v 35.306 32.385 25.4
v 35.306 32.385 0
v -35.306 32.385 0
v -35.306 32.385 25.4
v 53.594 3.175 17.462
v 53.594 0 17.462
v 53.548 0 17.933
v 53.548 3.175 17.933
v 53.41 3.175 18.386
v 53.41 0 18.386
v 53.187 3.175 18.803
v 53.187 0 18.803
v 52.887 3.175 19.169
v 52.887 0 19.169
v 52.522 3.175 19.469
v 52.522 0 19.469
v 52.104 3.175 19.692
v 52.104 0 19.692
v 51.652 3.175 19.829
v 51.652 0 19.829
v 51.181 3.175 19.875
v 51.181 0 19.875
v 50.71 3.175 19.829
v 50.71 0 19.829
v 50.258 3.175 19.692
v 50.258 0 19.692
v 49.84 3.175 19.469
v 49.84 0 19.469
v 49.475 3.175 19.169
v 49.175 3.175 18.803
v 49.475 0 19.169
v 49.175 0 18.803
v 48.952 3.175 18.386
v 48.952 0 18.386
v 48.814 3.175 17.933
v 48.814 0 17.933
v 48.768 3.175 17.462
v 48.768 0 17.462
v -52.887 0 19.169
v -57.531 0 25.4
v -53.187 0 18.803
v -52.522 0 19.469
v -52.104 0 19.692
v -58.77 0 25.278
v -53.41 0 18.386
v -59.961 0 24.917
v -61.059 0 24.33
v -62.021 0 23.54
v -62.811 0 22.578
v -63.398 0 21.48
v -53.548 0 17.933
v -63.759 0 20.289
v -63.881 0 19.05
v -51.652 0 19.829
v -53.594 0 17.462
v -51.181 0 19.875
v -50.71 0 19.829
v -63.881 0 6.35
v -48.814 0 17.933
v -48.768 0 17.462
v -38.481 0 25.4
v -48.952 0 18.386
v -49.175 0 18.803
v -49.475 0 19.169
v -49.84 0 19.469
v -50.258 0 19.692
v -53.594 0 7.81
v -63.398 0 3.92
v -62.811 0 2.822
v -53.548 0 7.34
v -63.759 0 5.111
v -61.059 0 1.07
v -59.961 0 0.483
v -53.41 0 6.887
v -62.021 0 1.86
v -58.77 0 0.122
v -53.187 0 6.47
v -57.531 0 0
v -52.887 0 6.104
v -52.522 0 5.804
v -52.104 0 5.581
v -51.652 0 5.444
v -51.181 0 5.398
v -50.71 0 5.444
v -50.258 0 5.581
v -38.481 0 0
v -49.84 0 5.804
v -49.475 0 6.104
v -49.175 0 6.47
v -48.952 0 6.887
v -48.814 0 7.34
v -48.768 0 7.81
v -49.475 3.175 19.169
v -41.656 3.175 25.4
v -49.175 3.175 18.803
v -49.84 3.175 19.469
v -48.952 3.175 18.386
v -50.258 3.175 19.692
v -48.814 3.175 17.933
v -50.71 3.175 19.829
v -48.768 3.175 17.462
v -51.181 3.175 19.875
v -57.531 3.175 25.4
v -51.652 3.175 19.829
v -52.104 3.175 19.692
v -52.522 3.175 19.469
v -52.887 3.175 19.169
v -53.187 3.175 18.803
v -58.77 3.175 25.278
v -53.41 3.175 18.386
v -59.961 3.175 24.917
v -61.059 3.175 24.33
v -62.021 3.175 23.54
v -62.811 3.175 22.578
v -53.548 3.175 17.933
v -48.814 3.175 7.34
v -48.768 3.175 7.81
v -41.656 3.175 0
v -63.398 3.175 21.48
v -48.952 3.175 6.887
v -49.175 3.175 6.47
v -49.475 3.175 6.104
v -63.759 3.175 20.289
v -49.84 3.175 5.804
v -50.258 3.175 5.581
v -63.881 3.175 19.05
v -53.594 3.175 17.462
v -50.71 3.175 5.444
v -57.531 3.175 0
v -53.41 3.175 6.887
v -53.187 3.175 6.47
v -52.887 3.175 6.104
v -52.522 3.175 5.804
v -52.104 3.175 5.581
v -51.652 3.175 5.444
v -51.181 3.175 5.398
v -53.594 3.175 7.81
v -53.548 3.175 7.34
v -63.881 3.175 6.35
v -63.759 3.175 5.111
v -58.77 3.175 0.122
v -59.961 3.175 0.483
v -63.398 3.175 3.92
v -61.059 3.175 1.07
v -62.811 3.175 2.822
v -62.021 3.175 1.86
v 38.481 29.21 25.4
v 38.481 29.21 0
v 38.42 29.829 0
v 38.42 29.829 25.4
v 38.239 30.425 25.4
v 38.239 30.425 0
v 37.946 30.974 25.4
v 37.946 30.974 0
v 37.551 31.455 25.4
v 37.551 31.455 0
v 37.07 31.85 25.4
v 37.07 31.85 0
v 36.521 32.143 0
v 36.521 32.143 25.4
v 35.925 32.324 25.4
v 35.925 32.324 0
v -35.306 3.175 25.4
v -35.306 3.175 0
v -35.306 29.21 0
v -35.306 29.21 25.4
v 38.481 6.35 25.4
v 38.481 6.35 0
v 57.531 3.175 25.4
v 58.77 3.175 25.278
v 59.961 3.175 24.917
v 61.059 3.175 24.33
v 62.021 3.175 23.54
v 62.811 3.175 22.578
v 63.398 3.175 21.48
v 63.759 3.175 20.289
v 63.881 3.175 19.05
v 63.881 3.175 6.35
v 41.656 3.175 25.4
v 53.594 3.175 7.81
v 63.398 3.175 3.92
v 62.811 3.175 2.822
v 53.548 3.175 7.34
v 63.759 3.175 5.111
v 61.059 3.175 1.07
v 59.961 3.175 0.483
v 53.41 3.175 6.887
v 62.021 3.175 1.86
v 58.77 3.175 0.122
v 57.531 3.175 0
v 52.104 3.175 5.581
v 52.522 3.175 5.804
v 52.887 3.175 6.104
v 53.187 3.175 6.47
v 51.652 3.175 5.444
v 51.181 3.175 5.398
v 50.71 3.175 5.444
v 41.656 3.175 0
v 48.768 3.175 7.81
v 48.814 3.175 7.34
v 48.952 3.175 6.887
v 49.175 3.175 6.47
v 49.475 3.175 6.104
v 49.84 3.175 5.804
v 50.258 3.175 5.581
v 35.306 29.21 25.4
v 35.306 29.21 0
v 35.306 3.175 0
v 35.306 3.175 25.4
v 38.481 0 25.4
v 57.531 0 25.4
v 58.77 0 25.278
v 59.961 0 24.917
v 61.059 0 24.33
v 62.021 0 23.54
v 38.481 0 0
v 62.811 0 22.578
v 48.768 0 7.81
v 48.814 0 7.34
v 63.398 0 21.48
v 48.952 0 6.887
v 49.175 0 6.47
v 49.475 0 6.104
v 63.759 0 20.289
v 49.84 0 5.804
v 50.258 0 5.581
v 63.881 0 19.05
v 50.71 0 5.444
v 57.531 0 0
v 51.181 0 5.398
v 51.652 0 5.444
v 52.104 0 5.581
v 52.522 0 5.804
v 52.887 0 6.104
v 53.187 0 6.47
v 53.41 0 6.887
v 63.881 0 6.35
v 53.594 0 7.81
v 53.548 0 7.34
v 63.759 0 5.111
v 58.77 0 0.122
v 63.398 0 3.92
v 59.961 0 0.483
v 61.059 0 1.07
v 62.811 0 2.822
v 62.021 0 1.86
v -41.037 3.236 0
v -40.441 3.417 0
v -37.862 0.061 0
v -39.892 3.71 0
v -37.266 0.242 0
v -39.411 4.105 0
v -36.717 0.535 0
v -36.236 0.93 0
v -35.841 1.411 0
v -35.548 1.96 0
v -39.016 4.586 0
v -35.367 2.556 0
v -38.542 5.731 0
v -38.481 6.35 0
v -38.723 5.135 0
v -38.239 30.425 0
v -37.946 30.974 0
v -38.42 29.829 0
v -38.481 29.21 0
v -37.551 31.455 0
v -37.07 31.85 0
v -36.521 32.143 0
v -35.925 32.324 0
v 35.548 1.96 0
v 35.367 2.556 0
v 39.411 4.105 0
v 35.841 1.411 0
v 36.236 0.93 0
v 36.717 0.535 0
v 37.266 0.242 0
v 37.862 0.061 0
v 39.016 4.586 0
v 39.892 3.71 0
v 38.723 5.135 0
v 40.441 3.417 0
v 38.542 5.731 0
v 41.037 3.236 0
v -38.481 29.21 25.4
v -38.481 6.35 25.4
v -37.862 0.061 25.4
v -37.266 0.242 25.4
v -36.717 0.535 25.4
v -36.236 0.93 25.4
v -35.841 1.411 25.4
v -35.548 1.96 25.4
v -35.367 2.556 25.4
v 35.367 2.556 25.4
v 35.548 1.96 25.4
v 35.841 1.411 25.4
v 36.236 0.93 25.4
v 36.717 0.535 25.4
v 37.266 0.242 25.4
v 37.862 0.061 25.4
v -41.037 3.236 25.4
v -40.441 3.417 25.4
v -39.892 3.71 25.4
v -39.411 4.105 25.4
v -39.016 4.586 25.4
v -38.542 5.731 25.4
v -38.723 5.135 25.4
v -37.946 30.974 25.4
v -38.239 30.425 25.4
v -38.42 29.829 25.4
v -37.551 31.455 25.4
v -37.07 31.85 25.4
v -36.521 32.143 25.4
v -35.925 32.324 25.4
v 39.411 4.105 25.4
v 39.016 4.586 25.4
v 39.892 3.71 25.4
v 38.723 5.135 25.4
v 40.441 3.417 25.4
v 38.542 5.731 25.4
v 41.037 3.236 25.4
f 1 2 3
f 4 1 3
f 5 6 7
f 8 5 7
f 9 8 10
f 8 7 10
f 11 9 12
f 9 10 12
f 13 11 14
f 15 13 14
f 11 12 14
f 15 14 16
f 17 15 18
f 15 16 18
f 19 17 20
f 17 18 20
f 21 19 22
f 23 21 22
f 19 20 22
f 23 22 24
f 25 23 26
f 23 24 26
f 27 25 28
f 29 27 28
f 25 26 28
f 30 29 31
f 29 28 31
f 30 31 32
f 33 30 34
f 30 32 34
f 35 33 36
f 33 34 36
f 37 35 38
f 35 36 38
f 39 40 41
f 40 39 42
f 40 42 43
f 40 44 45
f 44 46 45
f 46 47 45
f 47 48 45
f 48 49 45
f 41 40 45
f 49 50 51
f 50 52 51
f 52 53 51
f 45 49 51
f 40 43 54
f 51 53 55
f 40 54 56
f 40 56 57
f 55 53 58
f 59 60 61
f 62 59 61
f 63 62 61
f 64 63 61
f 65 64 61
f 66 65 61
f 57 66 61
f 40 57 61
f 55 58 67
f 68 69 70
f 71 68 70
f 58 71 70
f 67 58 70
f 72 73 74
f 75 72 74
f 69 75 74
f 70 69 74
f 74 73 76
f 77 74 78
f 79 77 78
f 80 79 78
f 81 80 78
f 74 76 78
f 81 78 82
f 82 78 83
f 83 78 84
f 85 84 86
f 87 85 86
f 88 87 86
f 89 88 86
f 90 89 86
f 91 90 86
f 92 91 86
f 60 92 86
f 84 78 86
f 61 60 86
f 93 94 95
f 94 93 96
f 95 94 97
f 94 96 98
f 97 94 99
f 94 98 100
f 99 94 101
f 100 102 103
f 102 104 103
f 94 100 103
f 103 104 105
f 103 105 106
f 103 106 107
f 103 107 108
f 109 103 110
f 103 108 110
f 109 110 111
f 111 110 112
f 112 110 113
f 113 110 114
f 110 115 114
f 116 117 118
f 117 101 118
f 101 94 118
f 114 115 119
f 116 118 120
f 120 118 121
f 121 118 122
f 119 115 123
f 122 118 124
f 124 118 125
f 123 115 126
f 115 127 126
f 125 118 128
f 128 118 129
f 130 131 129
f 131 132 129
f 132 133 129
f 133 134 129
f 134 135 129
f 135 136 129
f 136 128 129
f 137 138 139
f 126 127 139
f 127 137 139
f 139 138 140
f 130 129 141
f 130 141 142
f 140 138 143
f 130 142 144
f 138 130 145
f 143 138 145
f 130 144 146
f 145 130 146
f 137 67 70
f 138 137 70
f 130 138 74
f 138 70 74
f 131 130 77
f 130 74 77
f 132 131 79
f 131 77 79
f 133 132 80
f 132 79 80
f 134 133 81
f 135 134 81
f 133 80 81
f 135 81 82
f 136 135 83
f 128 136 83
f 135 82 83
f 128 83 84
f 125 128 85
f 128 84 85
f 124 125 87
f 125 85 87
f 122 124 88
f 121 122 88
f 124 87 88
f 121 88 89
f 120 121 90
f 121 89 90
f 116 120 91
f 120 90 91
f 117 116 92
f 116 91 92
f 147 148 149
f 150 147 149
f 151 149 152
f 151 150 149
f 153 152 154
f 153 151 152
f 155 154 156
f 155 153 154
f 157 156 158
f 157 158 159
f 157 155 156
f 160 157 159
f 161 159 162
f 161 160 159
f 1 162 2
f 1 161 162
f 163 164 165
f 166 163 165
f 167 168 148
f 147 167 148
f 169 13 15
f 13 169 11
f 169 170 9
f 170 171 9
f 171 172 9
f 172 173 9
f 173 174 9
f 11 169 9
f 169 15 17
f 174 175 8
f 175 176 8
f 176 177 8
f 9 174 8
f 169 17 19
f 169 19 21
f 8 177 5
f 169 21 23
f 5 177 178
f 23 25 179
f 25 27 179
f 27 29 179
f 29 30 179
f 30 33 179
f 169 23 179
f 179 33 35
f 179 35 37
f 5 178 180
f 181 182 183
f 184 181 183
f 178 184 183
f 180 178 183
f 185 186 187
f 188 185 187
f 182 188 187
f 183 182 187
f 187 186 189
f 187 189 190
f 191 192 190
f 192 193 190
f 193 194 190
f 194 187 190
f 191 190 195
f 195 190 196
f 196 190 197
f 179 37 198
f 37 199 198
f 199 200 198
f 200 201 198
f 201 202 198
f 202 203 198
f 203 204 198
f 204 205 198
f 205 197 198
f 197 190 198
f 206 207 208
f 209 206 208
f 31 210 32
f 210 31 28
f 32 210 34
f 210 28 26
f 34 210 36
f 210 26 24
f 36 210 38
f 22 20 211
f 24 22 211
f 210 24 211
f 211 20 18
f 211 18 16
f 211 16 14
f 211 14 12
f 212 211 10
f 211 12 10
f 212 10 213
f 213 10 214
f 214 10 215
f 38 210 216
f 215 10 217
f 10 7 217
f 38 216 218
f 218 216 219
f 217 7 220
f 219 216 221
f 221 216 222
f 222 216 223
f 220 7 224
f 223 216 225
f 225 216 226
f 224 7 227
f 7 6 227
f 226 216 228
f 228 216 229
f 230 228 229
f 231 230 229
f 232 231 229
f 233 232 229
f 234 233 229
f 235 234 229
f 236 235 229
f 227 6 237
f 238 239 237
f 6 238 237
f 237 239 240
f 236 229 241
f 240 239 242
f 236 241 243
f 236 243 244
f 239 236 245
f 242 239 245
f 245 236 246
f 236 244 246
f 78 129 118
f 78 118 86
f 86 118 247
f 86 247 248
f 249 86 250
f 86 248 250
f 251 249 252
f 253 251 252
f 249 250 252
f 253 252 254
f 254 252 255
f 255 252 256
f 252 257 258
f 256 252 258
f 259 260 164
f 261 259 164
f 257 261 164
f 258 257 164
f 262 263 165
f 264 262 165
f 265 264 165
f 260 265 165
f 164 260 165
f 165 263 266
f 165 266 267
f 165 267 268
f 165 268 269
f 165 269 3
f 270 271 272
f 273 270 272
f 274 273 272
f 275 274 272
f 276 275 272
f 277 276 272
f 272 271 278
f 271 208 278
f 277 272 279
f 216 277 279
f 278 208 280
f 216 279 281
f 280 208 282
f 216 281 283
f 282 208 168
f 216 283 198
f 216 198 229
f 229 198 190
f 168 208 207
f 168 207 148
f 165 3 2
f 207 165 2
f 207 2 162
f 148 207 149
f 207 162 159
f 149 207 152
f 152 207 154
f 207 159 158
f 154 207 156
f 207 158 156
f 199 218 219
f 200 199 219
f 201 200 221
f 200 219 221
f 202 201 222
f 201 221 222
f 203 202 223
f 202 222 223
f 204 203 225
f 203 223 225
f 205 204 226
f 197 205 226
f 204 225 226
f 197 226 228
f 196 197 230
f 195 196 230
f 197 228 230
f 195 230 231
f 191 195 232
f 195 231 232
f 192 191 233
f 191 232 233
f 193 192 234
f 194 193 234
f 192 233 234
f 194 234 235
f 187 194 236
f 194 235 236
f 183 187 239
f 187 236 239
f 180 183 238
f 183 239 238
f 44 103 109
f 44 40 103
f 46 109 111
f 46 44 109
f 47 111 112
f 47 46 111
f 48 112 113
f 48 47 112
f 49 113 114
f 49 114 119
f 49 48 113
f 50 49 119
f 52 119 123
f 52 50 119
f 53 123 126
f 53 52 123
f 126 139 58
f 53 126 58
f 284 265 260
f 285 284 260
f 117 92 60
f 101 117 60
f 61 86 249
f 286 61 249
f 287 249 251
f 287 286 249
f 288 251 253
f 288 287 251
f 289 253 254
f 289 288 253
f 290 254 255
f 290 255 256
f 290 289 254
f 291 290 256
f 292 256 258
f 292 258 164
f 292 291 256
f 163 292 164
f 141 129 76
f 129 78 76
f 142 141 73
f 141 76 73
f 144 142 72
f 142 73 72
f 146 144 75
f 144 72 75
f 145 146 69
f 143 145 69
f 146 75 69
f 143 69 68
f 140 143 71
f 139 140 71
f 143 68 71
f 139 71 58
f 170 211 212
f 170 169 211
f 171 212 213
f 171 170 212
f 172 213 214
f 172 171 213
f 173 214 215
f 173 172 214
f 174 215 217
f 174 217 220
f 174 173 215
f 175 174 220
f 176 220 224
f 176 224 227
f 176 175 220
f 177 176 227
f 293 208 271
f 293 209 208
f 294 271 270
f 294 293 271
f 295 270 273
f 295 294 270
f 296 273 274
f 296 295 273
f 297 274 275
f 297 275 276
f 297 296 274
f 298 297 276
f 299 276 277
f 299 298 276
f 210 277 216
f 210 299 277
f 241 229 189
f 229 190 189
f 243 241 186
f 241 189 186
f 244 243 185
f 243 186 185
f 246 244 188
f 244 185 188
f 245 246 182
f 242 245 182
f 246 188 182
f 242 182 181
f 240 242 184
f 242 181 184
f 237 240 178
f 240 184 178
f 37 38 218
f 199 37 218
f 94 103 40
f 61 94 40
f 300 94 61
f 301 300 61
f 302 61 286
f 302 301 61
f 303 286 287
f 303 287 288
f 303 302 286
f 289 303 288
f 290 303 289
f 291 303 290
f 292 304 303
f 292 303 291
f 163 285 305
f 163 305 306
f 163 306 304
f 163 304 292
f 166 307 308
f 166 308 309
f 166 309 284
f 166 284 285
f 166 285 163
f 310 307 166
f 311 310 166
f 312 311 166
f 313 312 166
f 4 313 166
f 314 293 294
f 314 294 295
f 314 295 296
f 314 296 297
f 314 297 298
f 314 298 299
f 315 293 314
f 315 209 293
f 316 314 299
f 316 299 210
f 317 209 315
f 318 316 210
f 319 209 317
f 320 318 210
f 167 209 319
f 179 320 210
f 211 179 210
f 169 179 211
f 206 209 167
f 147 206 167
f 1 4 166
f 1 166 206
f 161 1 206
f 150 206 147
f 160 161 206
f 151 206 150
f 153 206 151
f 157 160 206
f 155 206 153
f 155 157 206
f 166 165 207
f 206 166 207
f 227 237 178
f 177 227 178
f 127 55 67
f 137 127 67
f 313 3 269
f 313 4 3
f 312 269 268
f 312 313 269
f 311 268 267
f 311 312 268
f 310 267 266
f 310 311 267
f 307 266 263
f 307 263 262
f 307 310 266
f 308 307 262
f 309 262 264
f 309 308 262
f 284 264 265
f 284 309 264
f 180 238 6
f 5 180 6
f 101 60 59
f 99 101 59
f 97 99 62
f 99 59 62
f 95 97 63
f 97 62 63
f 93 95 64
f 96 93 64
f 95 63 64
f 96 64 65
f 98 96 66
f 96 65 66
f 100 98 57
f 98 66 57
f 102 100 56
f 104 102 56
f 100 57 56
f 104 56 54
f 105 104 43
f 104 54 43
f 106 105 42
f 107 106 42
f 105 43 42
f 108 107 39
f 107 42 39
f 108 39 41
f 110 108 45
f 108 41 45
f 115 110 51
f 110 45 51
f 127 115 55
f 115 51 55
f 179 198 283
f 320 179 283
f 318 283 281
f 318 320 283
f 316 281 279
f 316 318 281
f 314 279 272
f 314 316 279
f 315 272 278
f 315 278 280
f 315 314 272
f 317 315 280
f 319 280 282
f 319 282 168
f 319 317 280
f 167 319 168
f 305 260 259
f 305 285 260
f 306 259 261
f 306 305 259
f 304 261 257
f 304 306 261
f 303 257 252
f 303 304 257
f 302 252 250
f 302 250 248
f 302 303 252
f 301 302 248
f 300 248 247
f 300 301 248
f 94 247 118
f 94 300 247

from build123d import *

# Parameters (mm, degrees)
F1_DEPTH = 25.4
F2_R     = 3.175
F4_DEPTH = 32.386
F5_R     = 6.35


with BuildPart() as f1:
    # F0 (on Top) → F1 (new body)
    with BuildSketch(Plane.XY):
        Polygon((-35.306, 29.21), (0, 29.21), (35.306, 29.21), (35.306, 0), (63.881, 0), (63.881, 3.175), (38.481, 3.175), (38.481, 32.385), (0, 32.385), (-38.481, 32.385), (-38.481, 3.175), (-63.881, 3.175), (-63.881, 0), (-35.306, 0), align=None)
    extrude(amount=F1_DEPTH)

    # F2
    f2_edges = [f1.edges().sort_by_distance(p)[0] for p in [
        (-35.306, 0, 12.7),
        (35.306, 0, 12.7),
        (-38.481, 3.175, 12.7),
        (-38.481, 32.385, 12.7),
        (38.481, 32.385, 12.7),
        (38.481, 3.175, 12.7),
    ]]
    fillet(f2_edges, radius=F2_R)

    # F3 (on Front) → F4 (cut, through all)
    with BuildSketch(Plane.XZ):
        with BuildLine():
            ThreePointArc((-53.594, 7.8105), (-51.181, 5.3975), (-48.768, 7.8105))
            Line((-48.768, 7.8105), (-48.768, 17.4625))
            ThreePointArc((-48.768, 17.4625), (-51.181, 19.8755), (-53.594, 17.4625))
            Line((-53.594, 17.4625), (-53.594, 7.8105))
        make_face()
        with BuildLine():
            Line((48.768, 17.4625), (48.768, 7.8105))
            ThreePointArc((48.768, 7.8105), (51.181, 5.3975), (53.594, 7.8105))
            Line((53.594, 7.8105), (53.594, 17.4625))
            ThreePointArc((53.594, 17.4625), (51.181, 19.8755), (48.768, 17.4625))
        make_face()
    extrude(amount=-F4_DEPTH, mode=Mode.SUBTRACT)

    # F5
    f5_edges = [f1.edges().sort_by_distance(p)[0] for p in [
        (-63.881, 1.5875, 0),
        (-63.881, 1.5875, 25.4),
        (63.881, 1.5875, 25.4),
        (63.881, 1.5875, 0),
    ]]
    fillet(f5_edges, radius=F5_R)


solid = f1.part
